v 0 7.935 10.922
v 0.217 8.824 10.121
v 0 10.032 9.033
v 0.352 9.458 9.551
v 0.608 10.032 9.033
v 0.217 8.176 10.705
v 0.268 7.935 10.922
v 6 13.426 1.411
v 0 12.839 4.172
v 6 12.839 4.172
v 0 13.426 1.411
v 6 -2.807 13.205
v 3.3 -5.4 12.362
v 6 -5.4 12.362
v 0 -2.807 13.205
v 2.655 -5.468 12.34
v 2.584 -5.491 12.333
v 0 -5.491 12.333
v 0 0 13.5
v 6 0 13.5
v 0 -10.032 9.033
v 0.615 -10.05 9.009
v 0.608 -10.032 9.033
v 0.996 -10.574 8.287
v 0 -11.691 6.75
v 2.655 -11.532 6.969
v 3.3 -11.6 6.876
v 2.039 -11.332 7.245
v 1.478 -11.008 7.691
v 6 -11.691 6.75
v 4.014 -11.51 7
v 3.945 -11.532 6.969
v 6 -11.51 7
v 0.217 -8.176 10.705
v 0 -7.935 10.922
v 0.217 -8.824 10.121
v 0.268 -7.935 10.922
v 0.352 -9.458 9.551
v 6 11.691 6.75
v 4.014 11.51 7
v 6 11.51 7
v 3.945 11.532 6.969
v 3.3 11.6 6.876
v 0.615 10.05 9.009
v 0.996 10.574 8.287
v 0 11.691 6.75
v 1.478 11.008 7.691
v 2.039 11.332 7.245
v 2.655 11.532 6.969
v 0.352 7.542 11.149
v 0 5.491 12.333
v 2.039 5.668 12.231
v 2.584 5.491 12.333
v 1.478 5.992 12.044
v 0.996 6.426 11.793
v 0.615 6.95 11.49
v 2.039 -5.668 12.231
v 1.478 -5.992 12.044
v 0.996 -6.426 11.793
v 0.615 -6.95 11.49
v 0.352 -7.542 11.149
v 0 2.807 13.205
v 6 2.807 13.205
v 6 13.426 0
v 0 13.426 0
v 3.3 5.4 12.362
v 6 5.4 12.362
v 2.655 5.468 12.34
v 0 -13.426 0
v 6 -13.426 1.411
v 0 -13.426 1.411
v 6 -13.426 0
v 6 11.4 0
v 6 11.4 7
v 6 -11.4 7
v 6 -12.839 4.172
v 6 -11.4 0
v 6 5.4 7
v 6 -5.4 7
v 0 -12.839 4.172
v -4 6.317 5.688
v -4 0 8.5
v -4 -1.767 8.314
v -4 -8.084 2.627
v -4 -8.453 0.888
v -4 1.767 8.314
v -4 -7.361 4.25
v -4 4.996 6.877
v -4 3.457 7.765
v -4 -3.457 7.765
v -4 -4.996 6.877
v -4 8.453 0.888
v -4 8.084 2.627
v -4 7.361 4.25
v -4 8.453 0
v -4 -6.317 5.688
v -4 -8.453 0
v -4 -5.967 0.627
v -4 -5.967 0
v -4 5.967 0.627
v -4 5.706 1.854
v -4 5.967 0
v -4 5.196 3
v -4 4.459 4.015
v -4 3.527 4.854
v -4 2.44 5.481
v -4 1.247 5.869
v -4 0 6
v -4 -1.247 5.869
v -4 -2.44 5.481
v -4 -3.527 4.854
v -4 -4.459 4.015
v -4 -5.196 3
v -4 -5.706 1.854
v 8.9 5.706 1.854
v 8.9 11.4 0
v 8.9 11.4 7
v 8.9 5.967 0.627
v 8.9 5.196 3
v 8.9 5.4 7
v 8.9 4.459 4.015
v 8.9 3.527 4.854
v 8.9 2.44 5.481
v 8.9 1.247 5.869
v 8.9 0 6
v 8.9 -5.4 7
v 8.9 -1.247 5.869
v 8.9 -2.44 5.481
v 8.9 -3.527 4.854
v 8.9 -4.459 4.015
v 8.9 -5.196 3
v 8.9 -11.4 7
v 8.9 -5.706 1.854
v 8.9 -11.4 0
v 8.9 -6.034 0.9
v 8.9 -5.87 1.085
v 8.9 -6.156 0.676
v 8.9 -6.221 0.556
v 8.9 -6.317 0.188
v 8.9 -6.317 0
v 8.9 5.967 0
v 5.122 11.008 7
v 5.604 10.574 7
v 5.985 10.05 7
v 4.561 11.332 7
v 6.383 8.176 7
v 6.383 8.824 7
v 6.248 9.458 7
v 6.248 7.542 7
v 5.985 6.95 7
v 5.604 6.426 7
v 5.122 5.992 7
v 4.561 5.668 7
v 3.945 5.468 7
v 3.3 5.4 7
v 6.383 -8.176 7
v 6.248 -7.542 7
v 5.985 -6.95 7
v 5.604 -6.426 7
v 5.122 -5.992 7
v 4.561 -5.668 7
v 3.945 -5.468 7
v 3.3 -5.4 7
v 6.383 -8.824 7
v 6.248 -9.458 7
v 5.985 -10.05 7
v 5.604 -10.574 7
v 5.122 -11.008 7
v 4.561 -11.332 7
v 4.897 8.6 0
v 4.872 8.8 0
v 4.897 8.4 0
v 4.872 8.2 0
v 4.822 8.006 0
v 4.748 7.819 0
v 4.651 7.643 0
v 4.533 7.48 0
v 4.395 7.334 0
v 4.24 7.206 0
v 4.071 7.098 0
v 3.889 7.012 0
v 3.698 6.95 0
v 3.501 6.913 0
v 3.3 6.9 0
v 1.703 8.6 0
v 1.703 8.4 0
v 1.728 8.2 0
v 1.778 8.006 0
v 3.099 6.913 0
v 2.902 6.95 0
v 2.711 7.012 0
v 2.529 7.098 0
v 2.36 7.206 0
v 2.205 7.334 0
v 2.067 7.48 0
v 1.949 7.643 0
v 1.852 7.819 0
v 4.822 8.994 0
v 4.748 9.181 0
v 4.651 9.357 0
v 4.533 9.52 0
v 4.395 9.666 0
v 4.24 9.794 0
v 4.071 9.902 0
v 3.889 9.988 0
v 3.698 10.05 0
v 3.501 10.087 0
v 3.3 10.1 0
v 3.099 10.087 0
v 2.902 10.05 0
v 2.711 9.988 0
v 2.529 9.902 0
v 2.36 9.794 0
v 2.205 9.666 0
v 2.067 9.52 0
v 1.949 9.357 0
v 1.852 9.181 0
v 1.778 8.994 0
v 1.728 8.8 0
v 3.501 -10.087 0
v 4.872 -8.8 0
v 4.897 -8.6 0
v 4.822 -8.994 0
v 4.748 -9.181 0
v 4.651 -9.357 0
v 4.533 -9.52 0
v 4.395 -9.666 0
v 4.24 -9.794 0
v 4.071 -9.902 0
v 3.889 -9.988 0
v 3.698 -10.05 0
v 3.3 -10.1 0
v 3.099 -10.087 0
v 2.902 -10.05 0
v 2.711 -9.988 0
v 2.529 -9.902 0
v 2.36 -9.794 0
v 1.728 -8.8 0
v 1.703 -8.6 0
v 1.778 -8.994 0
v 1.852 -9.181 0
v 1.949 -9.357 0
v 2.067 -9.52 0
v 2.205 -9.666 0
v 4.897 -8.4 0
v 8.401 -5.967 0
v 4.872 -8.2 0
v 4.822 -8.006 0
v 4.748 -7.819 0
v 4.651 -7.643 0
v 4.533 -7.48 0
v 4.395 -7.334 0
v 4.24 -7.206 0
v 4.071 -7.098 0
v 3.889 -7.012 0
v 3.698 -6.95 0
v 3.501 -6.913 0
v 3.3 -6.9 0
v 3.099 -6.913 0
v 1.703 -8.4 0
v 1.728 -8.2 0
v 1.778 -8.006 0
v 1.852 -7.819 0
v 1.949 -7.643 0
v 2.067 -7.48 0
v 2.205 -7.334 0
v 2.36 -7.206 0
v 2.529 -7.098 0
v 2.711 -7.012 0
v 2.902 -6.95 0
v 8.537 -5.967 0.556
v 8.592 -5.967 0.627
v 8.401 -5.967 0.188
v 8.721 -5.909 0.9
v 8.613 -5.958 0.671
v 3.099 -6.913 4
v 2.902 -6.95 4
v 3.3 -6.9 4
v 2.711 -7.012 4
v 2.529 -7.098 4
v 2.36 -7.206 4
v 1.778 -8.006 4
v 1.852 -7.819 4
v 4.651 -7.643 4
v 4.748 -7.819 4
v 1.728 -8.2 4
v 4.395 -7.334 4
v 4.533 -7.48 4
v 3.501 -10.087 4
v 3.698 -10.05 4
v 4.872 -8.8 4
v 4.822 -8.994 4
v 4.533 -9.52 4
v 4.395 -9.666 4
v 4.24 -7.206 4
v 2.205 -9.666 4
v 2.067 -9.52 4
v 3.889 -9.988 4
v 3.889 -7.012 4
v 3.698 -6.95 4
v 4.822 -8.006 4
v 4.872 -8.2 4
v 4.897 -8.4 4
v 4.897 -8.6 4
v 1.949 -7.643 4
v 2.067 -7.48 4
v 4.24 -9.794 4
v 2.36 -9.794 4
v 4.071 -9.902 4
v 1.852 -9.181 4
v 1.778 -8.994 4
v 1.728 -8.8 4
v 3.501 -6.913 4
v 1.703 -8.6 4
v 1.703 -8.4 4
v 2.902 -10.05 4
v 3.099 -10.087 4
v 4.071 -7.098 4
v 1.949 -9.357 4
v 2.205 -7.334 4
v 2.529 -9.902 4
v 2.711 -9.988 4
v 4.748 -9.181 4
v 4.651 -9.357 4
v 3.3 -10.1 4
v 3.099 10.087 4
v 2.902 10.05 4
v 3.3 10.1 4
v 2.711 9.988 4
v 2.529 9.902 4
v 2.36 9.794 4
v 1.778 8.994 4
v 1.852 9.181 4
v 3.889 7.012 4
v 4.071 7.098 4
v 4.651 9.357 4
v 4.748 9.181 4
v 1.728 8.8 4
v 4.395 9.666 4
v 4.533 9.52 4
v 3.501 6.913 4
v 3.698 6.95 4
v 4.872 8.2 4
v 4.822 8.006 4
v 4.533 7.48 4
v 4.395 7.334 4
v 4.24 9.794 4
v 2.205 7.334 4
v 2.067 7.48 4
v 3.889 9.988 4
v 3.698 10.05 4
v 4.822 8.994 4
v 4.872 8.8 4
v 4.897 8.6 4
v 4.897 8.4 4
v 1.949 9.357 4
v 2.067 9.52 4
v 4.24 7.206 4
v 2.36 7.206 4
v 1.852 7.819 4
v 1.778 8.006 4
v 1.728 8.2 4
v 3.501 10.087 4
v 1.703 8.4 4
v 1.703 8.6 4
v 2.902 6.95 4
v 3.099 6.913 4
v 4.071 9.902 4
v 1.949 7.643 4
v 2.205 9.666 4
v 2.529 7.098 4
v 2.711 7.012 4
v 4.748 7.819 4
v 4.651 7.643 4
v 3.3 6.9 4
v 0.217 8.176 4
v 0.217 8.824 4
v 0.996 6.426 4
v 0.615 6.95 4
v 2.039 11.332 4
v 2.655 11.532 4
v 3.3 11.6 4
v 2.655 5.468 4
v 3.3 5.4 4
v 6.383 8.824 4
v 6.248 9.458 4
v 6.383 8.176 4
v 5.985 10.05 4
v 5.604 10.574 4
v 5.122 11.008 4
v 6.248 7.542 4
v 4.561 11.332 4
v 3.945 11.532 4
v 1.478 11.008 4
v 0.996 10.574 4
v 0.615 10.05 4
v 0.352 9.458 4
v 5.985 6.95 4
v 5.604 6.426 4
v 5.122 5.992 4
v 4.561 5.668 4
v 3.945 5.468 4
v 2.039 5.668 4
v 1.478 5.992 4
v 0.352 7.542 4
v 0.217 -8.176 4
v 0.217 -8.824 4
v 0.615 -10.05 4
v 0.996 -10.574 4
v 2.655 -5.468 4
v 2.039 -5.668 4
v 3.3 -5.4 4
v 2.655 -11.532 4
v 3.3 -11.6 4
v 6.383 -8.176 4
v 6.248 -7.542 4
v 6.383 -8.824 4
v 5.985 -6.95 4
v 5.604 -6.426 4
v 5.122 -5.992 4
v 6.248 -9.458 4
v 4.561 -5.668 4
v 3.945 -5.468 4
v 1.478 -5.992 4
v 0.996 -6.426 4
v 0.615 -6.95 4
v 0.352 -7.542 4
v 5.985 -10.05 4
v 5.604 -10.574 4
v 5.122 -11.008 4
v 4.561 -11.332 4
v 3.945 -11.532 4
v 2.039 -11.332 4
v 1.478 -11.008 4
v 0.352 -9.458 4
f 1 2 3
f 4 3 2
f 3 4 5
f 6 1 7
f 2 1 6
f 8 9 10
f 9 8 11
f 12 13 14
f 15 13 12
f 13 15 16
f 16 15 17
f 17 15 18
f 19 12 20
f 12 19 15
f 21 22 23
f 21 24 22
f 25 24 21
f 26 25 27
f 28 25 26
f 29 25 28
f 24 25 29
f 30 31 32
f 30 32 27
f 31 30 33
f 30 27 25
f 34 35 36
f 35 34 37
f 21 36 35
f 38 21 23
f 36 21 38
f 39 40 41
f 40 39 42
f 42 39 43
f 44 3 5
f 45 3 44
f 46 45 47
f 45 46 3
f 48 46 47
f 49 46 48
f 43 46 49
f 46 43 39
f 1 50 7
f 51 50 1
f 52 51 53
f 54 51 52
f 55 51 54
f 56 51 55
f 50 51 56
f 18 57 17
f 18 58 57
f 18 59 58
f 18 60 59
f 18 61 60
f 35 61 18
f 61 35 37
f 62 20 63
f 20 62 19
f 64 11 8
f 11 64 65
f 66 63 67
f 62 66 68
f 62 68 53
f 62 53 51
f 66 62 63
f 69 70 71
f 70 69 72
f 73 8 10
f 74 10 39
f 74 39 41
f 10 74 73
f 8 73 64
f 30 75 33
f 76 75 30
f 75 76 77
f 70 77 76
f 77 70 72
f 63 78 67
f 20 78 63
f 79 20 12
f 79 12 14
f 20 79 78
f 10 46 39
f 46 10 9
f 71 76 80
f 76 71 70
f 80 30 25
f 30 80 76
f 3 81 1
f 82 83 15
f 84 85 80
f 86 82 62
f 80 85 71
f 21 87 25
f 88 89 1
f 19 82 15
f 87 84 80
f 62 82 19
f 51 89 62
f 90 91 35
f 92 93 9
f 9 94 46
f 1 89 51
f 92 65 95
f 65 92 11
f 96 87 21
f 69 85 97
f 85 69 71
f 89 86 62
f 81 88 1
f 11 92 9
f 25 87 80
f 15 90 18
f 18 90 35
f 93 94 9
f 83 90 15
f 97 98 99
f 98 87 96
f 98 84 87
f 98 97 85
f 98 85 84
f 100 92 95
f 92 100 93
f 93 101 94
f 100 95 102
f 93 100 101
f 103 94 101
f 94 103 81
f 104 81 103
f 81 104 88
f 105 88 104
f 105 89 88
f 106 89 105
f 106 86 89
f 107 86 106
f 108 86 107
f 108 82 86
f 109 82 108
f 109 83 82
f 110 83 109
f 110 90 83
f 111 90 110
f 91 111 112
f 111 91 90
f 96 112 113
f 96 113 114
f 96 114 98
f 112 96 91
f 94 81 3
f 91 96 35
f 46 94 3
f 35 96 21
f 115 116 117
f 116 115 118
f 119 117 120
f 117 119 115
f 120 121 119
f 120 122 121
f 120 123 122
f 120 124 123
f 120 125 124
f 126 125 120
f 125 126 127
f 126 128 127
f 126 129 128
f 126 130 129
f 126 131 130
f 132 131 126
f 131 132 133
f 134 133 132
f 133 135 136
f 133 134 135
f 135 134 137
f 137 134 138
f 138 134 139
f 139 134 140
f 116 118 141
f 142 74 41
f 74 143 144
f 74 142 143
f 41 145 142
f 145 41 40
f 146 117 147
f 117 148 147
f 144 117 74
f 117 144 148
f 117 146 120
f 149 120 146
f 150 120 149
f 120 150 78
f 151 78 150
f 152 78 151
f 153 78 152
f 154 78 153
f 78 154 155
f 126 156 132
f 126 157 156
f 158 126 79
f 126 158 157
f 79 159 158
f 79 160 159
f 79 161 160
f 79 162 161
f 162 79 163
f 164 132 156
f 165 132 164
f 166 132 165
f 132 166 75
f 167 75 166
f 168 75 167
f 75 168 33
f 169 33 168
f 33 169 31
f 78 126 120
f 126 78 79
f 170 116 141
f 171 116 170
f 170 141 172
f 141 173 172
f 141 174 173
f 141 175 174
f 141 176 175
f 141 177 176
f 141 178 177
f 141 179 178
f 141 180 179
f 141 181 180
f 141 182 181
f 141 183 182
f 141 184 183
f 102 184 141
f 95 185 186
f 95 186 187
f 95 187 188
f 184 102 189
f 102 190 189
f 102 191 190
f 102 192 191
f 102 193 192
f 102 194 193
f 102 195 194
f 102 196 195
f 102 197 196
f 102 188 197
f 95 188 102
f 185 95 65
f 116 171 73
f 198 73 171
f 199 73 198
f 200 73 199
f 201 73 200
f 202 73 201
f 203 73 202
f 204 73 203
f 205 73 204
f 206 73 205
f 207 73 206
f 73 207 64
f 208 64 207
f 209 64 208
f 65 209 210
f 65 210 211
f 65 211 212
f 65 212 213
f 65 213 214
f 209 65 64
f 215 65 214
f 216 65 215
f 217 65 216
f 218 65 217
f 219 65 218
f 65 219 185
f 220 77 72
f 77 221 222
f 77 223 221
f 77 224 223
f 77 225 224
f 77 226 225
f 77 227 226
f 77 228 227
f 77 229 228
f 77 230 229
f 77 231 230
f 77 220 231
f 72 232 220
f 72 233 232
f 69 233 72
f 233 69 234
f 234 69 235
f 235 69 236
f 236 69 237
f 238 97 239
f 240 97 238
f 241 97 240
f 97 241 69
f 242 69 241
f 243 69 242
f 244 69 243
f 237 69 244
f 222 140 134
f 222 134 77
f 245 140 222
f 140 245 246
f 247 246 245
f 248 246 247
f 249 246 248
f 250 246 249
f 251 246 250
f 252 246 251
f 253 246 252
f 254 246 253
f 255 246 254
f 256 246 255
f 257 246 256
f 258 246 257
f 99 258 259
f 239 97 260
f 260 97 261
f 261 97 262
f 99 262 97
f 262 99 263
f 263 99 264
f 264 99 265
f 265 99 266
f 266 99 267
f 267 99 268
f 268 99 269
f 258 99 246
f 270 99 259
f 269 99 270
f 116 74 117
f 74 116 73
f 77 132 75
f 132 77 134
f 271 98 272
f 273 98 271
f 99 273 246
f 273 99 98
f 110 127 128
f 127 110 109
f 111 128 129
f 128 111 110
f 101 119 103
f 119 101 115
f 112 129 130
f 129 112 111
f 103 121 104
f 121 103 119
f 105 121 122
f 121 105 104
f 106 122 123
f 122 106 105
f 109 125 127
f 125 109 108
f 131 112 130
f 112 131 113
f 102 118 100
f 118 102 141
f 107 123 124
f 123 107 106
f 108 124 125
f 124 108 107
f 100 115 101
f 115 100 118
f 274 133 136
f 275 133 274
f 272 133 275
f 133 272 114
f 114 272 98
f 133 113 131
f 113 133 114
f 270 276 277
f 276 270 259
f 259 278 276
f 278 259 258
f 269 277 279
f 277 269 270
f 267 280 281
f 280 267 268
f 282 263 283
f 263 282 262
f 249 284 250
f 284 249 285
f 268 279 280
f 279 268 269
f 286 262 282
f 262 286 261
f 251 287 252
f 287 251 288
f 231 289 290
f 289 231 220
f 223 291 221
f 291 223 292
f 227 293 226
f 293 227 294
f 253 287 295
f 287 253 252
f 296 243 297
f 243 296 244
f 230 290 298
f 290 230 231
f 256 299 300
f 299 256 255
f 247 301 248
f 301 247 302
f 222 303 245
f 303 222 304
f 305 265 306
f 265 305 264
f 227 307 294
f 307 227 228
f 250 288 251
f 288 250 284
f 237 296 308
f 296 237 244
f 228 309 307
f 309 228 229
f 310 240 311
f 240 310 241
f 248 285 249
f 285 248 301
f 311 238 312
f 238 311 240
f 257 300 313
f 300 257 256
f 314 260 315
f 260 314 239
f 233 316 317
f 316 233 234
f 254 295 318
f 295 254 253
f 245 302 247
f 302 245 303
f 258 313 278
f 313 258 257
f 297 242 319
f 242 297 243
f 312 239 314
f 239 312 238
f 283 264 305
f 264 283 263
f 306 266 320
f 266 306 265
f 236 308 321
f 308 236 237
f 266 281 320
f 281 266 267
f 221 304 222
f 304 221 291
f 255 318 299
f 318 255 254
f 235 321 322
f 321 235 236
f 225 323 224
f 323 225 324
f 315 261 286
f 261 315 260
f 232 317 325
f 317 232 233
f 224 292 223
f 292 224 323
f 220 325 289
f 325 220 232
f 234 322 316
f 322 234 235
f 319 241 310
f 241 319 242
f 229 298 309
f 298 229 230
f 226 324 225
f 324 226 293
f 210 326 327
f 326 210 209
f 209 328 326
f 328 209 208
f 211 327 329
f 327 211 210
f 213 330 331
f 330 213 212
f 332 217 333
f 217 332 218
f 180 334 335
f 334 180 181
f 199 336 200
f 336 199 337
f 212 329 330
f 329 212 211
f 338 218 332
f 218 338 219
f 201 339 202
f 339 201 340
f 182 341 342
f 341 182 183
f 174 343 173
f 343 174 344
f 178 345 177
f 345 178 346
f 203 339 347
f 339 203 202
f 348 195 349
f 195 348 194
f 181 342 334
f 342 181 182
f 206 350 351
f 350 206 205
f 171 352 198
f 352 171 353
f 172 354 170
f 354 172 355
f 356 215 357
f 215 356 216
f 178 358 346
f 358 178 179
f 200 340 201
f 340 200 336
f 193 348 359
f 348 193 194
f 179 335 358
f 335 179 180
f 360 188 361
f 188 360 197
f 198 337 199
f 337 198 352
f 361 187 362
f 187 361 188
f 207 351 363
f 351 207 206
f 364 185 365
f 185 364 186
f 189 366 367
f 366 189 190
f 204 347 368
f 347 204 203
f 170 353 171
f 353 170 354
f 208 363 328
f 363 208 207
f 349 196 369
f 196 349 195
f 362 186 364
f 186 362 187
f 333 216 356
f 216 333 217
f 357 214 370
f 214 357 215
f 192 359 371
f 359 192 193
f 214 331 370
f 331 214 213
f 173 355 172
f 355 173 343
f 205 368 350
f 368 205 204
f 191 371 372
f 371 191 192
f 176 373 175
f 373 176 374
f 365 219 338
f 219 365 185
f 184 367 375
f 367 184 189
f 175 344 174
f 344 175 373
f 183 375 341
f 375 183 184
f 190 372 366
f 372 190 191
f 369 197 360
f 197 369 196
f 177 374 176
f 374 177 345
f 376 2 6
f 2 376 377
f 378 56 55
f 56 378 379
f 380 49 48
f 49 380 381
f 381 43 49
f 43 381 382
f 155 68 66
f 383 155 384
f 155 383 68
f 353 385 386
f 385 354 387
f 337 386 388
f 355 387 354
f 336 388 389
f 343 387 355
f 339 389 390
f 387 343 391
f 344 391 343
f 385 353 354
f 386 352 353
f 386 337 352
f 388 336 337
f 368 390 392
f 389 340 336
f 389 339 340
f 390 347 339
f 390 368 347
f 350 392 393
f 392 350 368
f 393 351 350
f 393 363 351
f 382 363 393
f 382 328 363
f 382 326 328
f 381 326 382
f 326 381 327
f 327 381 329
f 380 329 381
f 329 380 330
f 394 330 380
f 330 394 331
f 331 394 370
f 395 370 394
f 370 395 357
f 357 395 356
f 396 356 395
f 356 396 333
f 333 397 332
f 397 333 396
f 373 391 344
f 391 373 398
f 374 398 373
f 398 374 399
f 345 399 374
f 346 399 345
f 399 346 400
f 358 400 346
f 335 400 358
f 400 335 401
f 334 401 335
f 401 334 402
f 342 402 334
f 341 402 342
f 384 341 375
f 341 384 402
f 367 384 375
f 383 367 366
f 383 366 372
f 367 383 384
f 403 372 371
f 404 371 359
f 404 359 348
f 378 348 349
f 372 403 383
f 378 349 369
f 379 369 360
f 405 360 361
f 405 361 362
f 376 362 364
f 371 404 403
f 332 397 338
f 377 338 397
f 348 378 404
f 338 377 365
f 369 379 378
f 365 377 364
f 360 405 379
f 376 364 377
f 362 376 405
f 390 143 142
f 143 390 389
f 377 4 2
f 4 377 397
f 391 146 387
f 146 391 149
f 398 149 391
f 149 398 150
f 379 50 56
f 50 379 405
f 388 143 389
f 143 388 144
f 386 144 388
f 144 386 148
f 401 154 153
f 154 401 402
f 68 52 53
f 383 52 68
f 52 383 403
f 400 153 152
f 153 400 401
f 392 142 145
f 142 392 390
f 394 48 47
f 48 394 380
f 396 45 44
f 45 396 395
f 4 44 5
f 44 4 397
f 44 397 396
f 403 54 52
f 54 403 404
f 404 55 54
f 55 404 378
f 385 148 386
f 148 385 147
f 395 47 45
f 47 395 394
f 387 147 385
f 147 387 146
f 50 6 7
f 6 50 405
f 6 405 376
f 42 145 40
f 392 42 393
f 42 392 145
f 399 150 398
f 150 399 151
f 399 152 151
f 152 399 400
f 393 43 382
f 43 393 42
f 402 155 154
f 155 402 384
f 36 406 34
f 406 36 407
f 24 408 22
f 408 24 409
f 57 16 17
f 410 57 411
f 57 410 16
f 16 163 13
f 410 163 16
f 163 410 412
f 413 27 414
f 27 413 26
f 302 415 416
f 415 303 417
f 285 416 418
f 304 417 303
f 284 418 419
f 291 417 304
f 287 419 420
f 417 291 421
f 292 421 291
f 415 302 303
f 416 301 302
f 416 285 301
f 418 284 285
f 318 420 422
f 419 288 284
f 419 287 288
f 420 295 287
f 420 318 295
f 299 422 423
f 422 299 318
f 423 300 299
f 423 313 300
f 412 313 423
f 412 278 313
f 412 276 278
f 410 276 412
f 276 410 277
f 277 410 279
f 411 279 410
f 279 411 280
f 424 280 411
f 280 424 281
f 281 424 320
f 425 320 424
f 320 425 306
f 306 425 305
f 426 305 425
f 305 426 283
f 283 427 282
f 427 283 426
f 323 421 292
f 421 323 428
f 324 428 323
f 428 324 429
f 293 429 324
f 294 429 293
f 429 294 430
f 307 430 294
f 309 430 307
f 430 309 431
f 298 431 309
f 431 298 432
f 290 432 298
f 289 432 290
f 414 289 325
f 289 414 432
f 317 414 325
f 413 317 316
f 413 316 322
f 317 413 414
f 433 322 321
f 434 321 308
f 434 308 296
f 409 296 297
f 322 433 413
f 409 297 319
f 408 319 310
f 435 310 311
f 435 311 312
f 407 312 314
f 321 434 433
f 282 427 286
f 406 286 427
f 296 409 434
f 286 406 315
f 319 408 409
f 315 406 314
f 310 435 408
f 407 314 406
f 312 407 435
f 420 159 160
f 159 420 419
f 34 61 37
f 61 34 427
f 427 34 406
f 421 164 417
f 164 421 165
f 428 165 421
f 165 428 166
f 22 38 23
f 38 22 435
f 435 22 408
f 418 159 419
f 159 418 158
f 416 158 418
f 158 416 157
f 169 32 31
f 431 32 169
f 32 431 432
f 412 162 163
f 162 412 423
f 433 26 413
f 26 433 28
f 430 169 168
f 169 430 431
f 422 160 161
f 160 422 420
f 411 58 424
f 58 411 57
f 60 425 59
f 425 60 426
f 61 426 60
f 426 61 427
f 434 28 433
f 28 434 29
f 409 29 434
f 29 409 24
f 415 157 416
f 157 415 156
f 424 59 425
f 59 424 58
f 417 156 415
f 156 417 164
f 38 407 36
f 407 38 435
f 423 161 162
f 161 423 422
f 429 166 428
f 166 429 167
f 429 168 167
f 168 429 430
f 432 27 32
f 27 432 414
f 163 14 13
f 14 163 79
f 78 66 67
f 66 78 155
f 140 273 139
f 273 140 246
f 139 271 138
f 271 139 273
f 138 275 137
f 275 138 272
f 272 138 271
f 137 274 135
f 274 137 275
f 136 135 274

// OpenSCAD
// PRUSA iteration4
// Extruder cable clip
// GNU GPL v3
// Josef Průša <iam@josefprusa.cz> and contributors
// http://www.reprap.org/wiki/Prusa_Mendel
// http://prusamendel.org

module extruder_cable_clip(){
    difference(){
        difference(){
            union(){
                // Body shape
                translate([-6,28,28]) rotate([0,90,0]) cylinder(h=6,r=13.5,$fn=30);
                translate([-10,28,28]) rotate([0,90,0]) cylinder(h=4,r1=8.5,r2=13.5,$fn=30);
                translate([0,16.6,28]) cube([2.9,22.8,7]);
            }

            // Bottom cut and shape
            translate([-15,7,13]) cube([30,40,15]);
            translate([-20,28,28]) rotate([0,90,0]) cylinder(h=40,r=6,$fn=30);

            // Screws
            translate([-2.7,19.5,25]) rotate([0,0,90]) cylinder(h=10,r=1.6,$fn=50);
            translate([-2.7,36.5,25]) rotate([0,0,90]) cylinder(h=10,r=1.6,$fn=50);
            translate([-2.7,36.5,32]) rotate([0,0,90]) cylinder(h=13,r=3.1,$fn=30);
            translate([-2.7,19.5,32]) rotate([0,0,90]) cylinder(h=13,r=3.1,$fn=30);

            // Screw heads opening
            translate([-2.7,16.4,35]) cube([10,6.2,15]);
            translate([-2.7,33.4,35]) cube([10,6.2,15]);
        }
        difference(){
            // Cable grip
            translate([-8,28,28]) rotate([0,90,0]) cylinder(h=10,r=6,$fn=30);
            translate([-20,28,28]) rotate([0,90,0]) cylinder(h=40,r=5.5,$fn=30);
            translate([-15,7,13]) cube([30,40,15]);
            translate([-6,7,13]) cube([2,40,25]);
            translate([-2,7,13]) cube([2,40,25]);
        }

        // Nylon hole
        translate([-3,28,28]) rotate([35,90,0]) cylinder(h=24,r=1.8,$fn=30);
    }
}

//translate([0,0,0]) extruder_cable_clip();

translate([6,-28,-28]) extruder_cable_clip();
